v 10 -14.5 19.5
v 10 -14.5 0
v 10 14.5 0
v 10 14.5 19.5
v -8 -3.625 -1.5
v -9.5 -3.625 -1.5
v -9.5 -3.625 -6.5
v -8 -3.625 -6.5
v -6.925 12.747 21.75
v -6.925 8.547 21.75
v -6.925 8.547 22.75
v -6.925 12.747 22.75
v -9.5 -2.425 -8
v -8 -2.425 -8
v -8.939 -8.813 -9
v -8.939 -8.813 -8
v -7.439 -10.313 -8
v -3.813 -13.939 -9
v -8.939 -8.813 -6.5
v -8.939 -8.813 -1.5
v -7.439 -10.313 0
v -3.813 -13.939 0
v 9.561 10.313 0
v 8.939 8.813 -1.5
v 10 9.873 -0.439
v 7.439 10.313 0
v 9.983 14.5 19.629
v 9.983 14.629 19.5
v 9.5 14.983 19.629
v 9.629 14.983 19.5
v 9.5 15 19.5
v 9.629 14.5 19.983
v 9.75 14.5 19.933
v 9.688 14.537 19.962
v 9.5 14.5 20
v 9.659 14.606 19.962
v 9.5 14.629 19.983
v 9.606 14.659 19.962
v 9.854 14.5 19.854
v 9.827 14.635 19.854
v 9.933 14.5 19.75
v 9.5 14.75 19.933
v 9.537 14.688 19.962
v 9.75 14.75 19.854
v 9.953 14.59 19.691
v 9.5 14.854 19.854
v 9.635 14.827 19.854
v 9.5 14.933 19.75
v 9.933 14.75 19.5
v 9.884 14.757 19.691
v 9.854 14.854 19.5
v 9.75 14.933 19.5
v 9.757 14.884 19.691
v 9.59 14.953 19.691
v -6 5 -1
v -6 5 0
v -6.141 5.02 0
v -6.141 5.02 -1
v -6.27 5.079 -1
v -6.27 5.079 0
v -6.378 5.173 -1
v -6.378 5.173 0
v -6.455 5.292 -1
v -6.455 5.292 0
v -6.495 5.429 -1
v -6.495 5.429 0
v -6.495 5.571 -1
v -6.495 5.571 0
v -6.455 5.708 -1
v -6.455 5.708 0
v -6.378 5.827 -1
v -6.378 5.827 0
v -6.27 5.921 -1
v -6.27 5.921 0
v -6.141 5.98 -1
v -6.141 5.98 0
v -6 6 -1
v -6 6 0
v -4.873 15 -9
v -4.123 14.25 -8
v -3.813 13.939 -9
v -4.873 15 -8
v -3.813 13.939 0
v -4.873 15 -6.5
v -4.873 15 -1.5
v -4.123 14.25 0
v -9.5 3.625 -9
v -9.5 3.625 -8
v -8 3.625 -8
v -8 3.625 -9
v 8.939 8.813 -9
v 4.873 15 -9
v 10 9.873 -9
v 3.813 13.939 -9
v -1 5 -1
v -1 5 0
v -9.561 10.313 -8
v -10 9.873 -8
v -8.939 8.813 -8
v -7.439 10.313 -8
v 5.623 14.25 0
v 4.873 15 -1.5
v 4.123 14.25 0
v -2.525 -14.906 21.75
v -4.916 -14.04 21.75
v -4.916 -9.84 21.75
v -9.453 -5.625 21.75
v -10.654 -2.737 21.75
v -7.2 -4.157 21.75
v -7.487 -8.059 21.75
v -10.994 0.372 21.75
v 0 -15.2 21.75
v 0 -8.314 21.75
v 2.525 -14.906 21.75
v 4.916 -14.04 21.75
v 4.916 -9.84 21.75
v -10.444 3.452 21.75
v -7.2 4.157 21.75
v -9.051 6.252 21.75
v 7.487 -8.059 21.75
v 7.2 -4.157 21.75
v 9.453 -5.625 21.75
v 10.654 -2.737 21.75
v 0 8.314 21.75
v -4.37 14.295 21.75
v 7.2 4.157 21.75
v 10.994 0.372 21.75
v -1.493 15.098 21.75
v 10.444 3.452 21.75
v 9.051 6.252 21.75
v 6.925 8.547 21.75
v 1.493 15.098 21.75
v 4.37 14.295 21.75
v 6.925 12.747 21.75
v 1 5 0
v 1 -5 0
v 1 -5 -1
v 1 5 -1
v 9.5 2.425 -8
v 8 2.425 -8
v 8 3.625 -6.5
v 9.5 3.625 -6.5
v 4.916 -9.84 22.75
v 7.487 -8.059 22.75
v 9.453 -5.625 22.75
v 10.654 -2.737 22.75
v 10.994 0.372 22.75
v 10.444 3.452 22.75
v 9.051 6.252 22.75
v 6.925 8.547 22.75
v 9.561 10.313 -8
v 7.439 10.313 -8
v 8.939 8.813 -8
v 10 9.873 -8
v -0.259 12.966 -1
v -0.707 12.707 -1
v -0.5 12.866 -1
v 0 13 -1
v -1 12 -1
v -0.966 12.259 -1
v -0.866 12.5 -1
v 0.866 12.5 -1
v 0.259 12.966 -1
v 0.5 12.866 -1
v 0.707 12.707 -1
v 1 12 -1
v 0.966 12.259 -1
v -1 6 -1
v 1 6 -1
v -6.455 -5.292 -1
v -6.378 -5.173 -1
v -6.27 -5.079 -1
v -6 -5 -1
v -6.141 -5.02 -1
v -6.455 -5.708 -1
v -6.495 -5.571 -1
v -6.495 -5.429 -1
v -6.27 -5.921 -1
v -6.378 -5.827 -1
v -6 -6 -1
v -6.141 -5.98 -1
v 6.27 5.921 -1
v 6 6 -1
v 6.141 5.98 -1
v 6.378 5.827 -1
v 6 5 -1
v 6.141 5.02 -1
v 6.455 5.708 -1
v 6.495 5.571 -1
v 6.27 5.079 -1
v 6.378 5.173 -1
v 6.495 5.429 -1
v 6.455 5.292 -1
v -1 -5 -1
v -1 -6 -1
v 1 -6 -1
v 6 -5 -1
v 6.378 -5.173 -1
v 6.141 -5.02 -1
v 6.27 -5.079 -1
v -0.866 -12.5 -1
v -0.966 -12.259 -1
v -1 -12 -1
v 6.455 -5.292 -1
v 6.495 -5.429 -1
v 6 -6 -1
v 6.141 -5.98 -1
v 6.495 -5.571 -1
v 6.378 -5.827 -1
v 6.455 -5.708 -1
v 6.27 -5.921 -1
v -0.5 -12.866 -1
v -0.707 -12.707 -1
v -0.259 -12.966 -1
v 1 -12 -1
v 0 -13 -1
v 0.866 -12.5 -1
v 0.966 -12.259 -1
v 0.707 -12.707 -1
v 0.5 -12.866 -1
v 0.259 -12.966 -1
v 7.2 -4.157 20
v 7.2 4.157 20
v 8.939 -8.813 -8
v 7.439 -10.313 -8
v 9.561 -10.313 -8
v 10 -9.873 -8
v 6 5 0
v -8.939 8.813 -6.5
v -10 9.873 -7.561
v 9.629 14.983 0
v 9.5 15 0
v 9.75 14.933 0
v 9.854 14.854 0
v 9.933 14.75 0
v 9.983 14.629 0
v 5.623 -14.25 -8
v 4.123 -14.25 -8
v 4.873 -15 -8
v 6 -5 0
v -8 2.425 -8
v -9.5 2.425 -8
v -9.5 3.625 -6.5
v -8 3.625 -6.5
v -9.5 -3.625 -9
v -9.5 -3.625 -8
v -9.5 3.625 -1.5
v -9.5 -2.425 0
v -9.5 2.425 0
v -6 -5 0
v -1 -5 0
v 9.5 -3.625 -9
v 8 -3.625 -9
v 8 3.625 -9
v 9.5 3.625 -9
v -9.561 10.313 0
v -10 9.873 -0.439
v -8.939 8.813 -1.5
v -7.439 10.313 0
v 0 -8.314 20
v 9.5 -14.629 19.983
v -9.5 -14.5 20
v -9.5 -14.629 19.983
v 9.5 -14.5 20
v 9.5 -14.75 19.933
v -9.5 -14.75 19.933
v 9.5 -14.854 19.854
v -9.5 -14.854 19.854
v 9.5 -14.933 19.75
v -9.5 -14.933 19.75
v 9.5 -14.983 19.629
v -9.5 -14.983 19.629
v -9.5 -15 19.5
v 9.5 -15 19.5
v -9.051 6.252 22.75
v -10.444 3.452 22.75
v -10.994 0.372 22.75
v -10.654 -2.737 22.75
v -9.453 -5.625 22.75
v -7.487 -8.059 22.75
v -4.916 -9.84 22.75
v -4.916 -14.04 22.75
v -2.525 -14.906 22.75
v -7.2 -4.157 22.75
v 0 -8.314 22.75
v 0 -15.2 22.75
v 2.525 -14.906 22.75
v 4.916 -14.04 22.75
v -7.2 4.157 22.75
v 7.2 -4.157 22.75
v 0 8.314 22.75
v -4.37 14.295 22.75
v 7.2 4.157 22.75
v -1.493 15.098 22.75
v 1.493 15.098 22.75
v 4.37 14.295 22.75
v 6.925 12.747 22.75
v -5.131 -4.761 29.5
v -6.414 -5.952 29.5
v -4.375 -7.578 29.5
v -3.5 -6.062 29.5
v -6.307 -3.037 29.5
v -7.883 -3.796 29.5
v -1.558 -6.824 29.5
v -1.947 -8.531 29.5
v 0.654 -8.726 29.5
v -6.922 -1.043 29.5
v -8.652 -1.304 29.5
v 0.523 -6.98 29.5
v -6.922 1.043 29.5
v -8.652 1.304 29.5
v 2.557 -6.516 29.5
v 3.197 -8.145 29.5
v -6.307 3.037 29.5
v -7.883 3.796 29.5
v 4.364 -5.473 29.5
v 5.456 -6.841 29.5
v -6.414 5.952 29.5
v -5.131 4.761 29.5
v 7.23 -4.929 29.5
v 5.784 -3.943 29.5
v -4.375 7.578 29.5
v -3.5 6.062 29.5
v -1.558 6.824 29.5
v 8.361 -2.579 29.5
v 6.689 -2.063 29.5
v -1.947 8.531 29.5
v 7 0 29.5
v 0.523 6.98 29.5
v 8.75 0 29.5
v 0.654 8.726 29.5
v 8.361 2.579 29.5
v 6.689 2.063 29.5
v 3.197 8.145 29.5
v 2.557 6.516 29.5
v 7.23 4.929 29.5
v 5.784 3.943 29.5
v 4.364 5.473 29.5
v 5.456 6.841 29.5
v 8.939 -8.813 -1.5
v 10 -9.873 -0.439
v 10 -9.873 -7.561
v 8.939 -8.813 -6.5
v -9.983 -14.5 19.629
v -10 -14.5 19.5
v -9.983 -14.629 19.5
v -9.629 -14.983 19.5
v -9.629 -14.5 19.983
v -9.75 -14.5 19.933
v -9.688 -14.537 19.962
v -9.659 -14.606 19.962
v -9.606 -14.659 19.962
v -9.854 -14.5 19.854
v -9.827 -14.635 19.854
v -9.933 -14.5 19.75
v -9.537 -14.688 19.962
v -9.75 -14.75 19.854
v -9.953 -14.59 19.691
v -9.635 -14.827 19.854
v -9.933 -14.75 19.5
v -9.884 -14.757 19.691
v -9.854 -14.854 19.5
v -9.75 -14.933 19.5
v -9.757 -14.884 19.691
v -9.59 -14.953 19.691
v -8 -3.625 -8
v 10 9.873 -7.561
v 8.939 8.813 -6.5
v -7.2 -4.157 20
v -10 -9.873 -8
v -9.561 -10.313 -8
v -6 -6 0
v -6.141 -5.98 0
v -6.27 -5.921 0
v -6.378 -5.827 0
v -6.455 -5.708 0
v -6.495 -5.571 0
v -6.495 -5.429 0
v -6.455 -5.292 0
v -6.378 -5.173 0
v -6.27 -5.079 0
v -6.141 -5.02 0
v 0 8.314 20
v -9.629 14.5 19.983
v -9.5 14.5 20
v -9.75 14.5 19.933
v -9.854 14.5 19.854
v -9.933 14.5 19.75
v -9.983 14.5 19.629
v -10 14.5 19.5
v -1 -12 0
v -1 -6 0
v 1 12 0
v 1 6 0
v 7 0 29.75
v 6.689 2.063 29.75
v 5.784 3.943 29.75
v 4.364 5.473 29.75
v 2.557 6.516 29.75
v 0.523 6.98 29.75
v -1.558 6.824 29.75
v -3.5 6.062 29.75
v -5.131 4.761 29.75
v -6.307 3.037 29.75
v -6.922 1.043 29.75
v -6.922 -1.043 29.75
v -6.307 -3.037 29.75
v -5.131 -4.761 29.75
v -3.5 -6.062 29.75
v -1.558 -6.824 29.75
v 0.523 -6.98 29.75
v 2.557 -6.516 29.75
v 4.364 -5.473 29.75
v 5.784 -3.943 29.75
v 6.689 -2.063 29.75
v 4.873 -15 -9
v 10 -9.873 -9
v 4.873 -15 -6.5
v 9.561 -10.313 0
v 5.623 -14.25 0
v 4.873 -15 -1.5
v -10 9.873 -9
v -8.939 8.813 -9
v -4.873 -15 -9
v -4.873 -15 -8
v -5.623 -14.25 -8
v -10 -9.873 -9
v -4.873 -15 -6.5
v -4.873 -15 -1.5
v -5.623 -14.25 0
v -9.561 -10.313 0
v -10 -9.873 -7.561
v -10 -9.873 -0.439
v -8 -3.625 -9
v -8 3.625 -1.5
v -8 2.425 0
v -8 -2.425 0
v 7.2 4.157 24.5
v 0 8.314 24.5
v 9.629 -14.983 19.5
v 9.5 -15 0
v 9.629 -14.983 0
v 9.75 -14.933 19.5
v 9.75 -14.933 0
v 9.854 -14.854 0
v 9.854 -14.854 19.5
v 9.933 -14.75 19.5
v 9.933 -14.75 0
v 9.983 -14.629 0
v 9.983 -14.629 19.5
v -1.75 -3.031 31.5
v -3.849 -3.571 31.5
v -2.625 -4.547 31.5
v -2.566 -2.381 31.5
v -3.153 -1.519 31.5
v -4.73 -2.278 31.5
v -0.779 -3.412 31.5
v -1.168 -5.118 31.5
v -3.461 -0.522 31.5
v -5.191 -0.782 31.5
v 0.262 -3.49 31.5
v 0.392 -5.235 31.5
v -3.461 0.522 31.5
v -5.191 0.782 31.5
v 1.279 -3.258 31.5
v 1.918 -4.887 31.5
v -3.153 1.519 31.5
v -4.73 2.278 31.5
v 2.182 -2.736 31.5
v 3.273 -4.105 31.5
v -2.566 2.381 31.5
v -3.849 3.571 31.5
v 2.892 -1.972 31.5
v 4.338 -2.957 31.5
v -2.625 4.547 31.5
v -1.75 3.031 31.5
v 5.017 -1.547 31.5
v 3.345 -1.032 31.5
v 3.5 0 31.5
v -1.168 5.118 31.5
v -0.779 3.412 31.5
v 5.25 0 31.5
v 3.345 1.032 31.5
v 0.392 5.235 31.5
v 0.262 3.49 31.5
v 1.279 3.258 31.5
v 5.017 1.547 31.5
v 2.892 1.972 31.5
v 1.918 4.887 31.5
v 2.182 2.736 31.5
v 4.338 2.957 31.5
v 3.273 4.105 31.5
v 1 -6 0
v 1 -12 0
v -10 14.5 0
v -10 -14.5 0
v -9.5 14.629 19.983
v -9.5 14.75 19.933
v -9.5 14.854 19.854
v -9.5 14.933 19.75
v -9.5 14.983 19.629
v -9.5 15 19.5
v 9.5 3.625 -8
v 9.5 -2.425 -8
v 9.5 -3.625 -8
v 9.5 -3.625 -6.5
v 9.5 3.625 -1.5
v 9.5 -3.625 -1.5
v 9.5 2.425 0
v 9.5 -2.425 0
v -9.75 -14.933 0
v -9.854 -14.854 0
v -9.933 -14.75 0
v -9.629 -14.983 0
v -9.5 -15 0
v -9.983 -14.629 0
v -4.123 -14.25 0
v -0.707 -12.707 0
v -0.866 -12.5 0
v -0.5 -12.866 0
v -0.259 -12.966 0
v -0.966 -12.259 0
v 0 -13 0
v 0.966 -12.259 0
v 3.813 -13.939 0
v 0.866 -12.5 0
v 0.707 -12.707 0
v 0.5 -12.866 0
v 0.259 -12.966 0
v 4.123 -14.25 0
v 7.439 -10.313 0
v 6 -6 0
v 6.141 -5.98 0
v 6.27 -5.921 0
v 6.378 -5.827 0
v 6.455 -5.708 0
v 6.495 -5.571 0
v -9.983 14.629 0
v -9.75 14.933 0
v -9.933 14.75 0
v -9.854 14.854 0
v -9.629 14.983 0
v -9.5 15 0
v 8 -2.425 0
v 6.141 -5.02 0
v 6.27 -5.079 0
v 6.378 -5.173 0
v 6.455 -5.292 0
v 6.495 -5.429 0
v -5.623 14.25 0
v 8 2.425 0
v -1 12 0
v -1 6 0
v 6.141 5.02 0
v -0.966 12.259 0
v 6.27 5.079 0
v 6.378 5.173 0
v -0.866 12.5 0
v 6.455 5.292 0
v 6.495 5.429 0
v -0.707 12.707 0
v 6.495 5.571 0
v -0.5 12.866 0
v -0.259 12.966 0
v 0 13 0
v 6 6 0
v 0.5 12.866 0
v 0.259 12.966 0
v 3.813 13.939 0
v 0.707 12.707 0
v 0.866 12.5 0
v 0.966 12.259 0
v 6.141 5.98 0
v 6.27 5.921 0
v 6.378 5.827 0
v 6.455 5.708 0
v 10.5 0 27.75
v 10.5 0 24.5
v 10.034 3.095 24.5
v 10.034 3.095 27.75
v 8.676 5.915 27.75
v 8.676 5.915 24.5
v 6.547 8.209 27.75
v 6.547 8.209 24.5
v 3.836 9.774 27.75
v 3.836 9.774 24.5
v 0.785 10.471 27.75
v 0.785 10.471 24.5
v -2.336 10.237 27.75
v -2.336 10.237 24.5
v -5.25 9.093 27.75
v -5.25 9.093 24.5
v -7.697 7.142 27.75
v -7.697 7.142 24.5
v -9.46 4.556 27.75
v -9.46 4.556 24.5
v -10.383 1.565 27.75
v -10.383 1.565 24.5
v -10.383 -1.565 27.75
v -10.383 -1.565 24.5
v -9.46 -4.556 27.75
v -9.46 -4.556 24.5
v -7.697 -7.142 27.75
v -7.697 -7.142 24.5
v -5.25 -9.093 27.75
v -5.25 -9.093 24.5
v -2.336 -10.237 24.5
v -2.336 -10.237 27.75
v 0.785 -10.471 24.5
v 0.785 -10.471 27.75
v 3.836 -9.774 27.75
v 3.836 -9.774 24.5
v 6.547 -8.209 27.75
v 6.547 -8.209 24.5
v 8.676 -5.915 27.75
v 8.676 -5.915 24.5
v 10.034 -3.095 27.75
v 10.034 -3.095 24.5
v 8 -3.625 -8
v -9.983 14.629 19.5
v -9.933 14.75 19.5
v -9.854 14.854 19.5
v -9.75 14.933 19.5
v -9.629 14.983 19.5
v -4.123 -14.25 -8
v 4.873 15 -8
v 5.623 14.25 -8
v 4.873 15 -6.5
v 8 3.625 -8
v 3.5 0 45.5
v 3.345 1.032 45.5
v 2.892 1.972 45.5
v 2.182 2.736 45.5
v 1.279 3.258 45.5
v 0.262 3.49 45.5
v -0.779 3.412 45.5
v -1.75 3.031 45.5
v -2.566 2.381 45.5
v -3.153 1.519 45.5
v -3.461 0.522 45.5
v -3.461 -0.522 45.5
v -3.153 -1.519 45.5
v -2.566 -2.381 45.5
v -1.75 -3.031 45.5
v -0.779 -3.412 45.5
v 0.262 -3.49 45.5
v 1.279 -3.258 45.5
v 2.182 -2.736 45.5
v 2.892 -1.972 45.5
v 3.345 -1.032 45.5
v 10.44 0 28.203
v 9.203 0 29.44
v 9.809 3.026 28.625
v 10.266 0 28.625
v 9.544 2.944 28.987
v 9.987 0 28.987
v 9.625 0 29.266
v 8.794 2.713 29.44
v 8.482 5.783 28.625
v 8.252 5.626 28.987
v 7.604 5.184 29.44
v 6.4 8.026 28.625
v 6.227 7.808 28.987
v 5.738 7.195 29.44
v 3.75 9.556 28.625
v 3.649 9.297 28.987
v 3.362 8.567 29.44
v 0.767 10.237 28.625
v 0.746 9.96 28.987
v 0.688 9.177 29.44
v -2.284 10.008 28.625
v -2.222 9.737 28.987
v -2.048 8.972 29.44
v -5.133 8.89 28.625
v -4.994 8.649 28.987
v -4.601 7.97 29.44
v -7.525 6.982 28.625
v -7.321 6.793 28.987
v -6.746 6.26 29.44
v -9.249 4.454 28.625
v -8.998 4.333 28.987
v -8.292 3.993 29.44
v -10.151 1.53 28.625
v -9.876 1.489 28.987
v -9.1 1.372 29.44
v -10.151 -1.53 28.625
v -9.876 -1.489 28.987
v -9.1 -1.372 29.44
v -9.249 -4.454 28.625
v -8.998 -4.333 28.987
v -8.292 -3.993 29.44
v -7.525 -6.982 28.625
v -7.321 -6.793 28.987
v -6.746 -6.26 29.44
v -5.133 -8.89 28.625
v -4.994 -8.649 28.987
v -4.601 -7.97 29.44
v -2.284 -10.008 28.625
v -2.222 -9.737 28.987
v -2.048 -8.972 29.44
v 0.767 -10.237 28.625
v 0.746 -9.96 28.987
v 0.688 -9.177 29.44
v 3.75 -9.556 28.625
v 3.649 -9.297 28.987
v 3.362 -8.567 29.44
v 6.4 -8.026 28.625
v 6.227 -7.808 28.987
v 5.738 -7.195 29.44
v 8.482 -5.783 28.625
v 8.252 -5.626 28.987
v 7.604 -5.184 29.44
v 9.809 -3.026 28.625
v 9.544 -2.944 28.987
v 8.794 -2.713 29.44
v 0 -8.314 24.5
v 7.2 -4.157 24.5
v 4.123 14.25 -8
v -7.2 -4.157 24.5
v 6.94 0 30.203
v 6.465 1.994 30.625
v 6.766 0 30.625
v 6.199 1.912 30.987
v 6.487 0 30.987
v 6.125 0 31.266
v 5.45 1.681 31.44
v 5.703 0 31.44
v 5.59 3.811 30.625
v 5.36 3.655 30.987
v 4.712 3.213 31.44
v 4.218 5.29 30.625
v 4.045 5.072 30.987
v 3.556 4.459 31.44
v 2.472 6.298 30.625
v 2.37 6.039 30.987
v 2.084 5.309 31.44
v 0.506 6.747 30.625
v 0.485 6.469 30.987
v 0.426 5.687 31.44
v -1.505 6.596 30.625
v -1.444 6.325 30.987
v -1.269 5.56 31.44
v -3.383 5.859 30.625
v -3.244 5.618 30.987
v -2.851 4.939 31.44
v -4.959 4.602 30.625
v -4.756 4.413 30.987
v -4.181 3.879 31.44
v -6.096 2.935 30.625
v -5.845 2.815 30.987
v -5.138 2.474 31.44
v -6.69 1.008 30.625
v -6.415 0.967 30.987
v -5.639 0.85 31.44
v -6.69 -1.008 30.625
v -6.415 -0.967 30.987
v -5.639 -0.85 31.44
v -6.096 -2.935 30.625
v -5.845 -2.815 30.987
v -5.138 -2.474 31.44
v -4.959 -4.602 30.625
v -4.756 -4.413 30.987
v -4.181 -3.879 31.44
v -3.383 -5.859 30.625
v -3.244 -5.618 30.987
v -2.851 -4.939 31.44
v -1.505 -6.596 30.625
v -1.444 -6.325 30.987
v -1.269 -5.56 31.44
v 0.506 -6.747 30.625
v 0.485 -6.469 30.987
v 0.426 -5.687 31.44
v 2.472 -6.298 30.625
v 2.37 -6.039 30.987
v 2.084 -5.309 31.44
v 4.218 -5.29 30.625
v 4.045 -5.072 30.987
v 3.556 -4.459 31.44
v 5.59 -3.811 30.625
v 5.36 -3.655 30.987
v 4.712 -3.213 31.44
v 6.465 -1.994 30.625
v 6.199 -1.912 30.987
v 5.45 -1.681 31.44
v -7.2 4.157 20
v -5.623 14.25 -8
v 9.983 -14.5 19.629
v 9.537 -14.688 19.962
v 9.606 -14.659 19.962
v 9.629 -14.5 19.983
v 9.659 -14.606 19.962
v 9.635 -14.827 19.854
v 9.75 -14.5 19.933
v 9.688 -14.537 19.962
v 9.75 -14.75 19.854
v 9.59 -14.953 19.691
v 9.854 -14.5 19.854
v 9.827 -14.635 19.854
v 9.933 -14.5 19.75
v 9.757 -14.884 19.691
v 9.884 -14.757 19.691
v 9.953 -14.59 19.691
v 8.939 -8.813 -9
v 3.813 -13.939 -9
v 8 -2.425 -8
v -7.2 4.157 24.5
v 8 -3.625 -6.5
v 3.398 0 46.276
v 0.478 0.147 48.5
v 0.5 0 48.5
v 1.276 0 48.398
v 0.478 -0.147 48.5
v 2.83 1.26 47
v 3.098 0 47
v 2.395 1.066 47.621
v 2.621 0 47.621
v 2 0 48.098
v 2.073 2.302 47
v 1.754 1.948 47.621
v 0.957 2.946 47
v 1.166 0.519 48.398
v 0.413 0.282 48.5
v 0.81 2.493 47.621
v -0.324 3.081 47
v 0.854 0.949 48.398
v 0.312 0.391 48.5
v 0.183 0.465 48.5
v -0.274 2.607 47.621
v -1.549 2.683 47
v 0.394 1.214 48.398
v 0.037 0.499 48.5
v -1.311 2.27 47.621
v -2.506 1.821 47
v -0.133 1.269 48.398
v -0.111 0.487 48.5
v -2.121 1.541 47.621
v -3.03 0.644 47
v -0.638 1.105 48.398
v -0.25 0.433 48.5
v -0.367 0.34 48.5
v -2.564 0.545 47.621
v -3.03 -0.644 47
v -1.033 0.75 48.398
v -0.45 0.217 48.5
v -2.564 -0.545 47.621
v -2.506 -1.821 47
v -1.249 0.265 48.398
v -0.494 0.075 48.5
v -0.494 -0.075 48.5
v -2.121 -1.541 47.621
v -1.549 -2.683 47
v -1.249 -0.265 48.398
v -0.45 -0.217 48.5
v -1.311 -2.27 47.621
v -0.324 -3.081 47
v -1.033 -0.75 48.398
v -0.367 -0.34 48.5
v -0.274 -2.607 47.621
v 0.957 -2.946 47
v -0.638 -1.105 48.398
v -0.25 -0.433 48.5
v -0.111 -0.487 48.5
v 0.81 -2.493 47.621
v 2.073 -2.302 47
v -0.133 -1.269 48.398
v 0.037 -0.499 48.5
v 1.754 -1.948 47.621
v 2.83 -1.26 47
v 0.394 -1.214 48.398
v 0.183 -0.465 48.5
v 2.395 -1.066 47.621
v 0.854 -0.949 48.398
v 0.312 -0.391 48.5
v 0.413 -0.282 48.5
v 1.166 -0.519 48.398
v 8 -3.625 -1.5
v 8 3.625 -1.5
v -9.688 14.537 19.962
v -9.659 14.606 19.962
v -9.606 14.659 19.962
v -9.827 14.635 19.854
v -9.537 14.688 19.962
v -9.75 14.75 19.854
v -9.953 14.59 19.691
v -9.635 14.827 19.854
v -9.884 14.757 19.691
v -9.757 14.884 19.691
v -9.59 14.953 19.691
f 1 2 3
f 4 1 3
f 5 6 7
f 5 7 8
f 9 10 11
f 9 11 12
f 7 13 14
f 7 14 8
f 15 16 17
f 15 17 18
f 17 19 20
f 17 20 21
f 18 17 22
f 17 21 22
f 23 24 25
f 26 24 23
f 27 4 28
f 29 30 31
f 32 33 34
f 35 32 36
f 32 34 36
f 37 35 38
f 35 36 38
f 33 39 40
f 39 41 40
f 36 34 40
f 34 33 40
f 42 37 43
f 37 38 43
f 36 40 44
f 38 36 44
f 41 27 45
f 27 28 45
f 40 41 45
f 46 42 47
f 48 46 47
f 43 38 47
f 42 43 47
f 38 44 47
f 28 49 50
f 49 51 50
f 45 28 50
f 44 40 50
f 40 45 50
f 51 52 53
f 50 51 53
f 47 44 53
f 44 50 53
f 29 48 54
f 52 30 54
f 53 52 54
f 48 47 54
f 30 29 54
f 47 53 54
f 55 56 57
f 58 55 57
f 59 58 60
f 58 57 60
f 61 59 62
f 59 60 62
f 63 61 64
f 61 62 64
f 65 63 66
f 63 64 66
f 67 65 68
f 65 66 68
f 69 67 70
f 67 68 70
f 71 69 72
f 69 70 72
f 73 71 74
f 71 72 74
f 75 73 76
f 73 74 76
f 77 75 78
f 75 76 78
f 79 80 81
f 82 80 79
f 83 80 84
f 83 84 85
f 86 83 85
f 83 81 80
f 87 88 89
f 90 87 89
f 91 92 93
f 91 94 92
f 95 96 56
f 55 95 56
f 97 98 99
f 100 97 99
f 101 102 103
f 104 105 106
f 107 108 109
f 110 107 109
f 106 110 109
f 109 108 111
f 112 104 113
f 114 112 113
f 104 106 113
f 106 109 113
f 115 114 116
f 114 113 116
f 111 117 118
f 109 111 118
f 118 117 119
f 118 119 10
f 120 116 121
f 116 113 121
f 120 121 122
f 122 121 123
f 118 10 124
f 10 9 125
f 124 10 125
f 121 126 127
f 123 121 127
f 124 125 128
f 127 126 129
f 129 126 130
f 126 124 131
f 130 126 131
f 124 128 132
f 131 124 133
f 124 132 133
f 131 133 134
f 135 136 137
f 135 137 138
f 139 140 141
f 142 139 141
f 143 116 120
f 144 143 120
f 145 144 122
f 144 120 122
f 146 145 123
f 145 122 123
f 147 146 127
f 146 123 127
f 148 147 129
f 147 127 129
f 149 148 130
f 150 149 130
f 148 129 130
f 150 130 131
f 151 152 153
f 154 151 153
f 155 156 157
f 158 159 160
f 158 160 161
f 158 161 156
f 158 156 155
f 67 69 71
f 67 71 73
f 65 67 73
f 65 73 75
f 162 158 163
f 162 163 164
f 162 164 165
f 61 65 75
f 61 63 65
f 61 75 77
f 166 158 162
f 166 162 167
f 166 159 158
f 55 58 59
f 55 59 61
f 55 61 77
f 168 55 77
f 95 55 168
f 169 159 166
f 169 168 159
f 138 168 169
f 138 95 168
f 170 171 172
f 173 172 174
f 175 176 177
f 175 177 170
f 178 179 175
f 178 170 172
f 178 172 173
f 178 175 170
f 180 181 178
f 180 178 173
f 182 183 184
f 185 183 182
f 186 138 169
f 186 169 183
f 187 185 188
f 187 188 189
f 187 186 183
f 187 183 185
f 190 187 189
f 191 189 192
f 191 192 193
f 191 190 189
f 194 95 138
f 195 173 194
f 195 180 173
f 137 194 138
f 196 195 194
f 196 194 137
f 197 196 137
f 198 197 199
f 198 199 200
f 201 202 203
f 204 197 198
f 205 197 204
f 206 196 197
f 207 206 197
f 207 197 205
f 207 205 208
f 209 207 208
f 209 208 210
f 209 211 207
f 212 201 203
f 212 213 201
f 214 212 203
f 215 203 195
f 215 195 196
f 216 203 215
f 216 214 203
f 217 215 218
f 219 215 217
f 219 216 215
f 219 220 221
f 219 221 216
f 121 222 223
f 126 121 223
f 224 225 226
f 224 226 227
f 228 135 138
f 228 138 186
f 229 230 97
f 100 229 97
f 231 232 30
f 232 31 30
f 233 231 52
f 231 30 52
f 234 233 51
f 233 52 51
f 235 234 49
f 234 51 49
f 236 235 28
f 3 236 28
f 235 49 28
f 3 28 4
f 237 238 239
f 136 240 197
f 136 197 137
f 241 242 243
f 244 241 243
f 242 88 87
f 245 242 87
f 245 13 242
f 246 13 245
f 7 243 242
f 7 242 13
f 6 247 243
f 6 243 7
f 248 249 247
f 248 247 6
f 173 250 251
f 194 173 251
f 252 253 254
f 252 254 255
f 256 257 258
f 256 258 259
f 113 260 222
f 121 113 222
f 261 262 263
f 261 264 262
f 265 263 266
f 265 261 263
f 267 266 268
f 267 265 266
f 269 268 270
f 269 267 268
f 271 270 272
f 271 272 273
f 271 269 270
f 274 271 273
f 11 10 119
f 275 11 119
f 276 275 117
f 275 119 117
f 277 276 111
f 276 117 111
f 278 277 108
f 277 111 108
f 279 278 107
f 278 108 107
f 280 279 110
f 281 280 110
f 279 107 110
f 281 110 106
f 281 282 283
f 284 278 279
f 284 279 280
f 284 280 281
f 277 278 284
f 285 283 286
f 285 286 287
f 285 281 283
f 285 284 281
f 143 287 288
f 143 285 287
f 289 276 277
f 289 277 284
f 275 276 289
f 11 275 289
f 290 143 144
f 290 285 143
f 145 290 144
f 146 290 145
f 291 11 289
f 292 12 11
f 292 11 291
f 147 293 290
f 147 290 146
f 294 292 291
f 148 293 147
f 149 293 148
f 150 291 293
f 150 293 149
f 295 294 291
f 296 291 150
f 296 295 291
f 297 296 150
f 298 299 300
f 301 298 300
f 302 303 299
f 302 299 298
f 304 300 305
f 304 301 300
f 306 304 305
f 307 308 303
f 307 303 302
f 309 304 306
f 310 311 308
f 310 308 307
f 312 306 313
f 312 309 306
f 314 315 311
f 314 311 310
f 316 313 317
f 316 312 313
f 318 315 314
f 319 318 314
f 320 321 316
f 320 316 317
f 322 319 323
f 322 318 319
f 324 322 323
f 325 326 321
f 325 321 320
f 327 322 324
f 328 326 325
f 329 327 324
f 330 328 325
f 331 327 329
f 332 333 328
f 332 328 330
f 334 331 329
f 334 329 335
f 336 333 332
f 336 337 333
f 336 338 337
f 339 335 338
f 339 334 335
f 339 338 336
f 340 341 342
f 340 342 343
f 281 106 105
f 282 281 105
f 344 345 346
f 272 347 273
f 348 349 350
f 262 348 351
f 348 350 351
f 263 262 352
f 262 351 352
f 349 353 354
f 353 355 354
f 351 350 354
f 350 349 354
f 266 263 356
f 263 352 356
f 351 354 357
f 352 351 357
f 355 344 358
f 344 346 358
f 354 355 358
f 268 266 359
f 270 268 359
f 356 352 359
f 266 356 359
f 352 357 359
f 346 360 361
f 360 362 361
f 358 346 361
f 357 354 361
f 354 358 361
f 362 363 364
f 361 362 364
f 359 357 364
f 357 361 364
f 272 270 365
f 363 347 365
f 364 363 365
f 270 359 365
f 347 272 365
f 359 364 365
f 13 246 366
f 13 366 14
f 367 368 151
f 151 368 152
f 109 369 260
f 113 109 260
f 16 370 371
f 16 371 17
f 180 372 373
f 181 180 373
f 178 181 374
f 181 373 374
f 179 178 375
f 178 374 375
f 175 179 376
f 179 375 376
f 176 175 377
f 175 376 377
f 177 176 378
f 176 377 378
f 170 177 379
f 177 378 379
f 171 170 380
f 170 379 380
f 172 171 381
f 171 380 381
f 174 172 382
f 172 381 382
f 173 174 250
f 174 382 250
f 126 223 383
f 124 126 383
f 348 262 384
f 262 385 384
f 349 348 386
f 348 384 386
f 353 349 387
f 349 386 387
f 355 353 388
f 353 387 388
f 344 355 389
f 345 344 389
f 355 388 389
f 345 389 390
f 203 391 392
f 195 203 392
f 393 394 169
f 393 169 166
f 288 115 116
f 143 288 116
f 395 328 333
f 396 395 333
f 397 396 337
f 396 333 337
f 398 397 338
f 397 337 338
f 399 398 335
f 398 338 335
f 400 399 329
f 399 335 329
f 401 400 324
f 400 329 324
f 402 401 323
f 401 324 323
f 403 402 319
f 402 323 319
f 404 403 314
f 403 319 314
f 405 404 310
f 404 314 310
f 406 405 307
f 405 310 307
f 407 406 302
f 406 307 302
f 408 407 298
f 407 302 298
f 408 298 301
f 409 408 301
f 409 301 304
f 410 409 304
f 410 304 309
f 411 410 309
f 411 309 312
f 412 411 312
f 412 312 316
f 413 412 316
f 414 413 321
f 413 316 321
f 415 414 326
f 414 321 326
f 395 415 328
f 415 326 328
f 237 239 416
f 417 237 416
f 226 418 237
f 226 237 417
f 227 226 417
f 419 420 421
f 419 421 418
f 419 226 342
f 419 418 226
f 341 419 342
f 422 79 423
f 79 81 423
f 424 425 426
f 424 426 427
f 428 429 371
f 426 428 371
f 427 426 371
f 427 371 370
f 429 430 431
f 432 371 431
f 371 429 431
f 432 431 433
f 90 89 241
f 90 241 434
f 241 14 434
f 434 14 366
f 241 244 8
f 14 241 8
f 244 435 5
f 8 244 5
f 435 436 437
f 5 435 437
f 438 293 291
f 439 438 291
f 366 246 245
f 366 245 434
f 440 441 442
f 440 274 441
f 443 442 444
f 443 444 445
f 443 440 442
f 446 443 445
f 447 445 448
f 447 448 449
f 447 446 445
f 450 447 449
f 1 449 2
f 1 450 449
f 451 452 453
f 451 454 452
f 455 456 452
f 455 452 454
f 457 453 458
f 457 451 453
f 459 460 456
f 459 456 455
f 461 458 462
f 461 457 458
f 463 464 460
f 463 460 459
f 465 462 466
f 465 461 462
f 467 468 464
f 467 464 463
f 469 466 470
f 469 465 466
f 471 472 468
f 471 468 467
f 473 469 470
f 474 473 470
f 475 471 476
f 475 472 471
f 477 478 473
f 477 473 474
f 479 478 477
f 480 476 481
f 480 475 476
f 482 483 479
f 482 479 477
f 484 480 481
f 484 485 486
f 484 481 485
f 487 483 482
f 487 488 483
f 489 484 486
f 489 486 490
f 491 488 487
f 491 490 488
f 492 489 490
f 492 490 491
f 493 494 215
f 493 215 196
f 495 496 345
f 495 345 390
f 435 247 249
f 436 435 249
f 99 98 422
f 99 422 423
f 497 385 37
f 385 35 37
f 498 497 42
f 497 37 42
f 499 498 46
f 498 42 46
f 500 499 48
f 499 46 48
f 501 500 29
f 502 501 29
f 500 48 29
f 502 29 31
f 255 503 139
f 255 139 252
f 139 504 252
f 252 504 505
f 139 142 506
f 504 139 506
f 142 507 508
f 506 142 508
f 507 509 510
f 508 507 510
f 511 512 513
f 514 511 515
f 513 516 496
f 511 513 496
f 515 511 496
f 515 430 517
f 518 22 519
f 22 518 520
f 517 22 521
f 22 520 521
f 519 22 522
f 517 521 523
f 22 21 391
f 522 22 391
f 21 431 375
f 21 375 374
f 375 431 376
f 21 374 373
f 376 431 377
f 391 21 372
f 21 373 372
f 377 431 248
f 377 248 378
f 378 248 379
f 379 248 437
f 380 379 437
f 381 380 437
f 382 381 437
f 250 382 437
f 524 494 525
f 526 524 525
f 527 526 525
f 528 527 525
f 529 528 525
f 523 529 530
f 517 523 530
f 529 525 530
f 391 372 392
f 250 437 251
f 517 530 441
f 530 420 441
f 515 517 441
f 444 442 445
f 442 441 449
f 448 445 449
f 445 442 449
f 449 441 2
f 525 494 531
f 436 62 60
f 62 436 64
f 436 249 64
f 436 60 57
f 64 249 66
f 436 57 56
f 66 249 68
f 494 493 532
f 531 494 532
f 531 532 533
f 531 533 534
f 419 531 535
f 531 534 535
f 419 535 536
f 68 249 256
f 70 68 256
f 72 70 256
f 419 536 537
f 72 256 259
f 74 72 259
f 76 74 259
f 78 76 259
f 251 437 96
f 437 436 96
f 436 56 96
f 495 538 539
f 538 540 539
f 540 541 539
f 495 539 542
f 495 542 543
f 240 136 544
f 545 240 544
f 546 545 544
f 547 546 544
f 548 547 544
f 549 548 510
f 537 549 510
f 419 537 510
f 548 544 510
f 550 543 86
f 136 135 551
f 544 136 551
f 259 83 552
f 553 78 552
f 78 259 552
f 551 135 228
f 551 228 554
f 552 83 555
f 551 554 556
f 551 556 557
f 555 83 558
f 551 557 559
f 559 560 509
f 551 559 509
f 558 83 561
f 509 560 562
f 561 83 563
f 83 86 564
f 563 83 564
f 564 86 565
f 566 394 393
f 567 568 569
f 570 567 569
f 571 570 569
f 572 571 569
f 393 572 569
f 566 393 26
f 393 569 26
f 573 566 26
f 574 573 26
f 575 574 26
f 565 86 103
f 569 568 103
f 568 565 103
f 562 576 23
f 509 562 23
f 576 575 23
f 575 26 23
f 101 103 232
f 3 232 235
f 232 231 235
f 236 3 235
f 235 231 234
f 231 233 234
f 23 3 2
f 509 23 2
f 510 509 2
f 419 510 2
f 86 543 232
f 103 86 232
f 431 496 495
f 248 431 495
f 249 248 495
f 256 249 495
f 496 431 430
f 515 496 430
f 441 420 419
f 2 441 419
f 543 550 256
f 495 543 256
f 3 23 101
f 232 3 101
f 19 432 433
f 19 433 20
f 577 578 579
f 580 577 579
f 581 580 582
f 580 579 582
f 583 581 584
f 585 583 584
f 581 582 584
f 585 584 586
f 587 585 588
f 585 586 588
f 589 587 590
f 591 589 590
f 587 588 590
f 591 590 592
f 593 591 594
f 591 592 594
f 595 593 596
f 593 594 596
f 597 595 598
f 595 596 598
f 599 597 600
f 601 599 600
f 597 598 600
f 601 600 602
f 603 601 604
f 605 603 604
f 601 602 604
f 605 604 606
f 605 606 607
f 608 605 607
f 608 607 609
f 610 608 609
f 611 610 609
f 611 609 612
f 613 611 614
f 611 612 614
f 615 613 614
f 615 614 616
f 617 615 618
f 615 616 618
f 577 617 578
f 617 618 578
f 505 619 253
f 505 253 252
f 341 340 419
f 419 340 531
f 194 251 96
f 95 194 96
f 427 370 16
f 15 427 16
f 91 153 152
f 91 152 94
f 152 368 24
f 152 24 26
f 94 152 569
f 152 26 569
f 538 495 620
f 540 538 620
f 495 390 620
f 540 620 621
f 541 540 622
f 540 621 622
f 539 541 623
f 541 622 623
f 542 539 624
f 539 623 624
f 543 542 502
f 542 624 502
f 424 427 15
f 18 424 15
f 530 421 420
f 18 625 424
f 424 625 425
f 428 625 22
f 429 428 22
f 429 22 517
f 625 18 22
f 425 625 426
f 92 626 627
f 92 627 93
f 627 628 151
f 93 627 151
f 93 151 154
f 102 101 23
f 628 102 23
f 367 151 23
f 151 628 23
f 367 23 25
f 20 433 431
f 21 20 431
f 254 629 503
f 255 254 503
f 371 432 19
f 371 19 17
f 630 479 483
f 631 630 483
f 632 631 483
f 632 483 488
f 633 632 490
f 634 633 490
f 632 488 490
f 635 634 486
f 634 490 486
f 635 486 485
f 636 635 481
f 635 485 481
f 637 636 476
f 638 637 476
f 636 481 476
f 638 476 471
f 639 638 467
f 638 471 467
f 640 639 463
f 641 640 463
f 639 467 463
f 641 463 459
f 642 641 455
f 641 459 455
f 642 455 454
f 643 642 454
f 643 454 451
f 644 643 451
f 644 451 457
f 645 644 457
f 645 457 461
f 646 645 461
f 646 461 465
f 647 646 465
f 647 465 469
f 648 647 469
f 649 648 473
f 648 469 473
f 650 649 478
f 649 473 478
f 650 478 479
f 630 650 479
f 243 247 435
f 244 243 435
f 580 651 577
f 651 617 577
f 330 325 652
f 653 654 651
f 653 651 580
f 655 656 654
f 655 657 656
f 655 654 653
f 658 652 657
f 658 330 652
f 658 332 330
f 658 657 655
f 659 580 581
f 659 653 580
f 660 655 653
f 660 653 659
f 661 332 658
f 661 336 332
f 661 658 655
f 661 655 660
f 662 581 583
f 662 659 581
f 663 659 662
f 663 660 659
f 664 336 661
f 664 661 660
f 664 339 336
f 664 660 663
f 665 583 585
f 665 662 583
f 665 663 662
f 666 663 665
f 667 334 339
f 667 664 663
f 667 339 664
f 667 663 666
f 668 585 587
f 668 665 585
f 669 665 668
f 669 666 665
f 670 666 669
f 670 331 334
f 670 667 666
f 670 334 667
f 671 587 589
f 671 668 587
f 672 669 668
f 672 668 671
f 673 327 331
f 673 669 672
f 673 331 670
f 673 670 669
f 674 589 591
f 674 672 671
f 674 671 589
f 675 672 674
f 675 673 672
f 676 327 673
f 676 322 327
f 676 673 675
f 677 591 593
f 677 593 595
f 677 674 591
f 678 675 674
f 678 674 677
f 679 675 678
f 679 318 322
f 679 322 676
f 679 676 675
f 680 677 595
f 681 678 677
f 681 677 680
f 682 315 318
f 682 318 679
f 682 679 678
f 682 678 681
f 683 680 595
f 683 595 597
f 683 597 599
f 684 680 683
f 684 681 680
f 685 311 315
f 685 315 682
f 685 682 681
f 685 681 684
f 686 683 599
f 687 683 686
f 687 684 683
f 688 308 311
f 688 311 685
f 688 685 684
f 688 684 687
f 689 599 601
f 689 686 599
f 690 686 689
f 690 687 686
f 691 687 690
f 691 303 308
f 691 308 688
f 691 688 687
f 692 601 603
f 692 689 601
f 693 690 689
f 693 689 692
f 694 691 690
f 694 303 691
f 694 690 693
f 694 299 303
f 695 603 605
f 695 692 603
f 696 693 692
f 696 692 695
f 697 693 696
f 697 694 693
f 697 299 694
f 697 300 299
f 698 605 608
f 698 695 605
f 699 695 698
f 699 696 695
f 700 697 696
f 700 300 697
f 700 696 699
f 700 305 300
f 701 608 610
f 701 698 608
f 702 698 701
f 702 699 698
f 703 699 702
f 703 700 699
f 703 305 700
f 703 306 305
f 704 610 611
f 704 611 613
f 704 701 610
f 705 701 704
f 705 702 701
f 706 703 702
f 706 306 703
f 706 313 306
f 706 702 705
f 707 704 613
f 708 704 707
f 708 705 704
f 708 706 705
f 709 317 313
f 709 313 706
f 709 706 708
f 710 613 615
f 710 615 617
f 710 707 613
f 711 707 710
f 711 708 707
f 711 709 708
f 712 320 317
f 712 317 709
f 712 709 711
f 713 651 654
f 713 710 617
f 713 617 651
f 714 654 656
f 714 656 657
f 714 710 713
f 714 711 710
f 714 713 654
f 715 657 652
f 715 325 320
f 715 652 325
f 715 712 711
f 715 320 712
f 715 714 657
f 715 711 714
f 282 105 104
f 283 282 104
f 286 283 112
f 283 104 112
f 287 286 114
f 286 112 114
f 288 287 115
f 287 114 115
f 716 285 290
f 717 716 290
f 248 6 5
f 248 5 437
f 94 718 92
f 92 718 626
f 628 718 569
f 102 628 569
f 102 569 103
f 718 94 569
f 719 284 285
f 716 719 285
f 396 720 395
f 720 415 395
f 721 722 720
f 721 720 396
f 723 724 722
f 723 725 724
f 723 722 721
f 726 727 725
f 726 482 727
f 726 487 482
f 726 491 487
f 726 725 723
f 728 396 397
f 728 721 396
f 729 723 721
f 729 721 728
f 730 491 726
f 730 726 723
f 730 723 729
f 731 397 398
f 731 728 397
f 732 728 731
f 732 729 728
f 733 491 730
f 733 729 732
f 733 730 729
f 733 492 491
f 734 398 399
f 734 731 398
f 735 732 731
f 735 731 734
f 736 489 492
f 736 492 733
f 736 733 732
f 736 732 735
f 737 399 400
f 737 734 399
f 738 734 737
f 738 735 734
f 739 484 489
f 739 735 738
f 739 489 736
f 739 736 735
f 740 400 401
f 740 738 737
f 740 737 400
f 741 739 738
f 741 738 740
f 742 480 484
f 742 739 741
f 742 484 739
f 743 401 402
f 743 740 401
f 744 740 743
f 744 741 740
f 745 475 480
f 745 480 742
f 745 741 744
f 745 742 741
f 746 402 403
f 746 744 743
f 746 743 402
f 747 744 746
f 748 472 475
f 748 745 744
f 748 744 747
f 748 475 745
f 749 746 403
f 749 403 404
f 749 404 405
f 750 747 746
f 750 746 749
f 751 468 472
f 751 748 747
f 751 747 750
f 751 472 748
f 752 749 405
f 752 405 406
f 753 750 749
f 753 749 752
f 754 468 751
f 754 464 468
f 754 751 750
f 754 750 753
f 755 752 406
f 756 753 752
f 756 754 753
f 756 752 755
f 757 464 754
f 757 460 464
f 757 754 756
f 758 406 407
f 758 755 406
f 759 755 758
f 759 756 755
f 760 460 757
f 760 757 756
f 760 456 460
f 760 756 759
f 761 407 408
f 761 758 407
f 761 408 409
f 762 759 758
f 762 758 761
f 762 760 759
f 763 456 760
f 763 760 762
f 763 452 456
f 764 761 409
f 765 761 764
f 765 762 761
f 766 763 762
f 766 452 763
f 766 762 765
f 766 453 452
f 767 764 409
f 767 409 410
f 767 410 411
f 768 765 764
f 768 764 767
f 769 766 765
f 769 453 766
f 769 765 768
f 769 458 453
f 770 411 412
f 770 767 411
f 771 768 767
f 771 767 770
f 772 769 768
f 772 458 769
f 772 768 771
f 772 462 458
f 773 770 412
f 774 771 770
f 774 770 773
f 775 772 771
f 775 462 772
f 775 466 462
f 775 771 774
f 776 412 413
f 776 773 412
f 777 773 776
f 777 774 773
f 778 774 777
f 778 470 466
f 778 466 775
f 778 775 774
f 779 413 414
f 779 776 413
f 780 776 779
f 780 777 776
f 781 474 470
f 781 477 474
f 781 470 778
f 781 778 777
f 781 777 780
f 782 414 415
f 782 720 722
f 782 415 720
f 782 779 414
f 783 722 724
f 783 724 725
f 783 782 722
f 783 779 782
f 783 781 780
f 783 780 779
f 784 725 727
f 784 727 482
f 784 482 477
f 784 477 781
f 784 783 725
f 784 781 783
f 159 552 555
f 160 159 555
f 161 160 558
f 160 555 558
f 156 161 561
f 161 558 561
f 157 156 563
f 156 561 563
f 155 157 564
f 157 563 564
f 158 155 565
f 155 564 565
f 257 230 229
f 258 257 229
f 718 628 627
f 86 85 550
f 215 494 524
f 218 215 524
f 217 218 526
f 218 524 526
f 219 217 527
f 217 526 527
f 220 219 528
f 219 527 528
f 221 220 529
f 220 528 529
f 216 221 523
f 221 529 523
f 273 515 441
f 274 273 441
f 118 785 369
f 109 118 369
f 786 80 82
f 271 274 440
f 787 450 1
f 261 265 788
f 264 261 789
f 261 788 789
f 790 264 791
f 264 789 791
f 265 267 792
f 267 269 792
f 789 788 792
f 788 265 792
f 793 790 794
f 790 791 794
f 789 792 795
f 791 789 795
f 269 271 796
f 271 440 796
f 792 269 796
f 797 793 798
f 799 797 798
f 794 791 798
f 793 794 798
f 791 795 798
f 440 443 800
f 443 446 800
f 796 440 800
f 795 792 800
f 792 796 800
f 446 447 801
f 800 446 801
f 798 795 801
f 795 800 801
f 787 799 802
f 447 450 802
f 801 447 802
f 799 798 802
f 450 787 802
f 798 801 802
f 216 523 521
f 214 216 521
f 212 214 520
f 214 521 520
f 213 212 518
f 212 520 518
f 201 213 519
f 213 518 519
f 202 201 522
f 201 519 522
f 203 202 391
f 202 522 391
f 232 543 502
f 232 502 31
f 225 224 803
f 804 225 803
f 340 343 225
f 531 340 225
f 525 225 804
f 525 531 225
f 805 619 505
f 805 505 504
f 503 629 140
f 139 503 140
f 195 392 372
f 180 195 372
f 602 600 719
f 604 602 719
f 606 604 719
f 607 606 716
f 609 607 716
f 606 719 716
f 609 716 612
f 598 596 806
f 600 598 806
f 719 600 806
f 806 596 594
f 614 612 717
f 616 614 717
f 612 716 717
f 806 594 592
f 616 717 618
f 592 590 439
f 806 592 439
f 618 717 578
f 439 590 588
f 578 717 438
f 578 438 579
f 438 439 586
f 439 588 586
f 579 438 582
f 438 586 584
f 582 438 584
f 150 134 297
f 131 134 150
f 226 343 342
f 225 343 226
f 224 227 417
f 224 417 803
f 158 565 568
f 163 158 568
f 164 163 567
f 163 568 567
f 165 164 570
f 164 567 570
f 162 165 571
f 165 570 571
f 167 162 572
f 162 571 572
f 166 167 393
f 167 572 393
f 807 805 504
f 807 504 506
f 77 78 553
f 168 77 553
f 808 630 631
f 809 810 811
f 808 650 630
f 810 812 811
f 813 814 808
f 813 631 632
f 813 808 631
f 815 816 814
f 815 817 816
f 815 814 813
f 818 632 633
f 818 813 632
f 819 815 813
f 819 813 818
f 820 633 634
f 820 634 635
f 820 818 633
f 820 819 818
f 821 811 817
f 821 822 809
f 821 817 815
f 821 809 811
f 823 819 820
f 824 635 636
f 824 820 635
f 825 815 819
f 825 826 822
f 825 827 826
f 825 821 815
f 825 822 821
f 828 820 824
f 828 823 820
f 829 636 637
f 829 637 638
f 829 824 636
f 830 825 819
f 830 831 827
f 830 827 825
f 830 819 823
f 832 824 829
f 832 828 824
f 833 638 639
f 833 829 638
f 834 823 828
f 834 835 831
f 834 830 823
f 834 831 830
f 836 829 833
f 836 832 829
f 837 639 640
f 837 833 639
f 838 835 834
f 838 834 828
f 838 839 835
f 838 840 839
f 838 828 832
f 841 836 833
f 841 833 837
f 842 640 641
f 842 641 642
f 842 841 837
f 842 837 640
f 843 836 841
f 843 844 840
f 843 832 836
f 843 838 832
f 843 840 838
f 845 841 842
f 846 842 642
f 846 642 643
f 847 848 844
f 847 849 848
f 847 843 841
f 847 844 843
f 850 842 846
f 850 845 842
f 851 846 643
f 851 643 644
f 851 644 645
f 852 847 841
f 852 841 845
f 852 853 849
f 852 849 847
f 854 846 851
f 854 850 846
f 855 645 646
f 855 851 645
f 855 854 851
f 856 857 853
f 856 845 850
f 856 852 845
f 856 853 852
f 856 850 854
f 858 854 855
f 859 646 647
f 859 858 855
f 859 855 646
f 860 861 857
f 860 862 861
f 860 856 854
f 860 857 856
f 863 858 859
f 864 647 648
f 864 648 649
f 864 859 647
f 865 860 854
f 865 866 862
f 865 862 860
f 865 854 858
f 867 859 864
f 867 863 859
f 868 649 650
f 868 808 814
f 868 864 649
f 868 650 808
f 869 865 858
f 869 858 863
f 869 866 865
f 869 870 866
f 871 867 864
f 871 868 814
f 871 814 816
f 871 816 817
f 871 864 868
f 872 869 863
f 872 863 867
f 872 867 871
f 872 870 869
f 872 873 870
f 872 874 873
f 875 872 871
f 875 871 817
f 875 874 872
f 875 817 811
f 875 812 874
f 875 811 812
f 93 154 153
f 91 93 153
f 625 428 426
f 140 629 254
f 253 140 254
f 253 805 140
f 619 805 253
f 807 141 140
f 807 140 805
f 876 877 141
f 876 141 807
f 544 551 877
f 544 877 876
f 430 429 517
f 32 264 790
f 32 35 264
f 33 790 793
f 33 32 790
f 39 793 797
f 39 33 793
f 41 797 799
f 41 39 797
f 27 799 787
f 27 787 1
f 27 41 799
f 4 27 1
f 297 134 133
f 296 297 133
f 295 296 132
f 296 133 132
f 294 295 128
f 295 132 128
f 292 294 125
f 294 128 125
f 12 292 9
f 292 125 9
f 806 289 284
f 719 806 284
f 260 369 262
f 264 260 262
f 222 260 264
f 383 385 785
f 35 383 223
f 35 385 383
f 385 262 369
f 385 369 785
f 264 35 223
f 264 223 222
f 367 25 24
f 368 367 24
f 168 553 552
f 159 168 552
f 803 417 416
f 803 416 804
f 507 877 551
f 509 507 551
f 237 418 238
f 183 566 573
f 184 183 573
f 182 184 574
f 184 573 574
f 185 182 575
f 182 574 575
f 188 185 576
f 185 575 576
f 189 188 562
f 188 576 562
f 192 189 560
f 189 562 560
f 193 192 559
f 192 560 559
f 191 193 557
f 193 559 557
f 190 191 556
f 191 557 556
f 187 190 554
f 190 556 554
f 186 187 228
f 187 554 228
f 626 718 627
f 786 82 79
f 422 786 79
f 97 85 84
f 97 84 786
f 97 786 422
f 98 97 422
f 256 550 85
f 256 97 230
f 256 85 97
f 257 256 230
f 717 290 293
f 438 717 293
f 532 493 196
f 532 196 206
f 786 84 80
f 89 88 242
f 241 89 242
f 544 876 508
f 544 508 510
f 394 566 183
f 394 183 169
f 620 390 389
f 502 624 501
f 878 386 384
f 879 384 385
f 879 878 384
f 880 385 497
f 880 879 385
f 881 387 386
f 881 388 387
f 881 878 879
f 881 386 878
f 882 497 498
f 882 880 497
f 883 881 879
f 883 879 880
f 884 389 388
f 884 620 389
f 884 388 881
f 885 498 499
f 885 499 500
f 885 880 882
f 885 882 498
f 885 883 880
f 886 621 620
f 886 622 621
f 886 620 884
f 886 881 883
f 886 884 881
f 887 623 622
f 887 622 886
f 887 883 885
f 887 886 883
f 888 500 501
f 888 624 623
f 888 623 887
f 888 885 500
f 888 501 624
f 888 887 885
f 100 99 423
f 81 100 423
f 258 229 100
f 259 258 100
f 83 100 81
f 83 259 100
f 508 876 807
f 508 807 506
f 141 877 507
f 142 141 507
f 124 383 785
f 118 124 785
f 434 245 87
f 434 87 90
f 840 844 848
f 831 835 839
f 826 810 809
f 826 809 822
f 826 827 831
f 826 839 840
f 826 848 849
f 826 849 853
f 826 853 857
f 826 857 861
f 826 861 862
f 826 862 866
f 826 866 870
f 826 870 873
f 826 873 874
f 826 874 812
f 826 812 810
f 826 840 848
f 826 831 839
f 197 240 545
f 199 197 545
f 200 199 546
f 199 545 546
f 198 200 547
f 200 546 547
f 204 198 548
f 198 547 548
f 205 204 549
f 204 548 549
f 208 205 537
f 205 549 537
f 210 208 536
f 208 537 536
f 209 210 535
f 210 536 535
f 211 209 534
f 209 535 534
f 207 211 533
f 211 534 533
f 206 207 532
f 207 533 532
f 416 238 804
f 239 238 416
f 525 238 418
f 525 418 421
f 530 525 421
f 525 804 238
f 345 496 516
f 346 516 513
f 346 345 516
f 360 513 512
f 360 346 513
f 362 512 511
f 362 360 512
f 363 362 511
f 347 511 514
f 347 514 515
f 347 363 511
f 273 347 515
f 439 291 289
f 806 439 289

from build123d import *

# Parameters (mm, degrees)
SKETCH_W     = 20
SKETCH_H     = 30
PAD_DEPTH    = 20
PAD001_DEPTH = 1.75
PAD002_DEPTH = 1
PAD003_DEPTH = 1.75
SKETCH004_R  = 10.5
PAD004_DEPTH = 5
SKETCH005_R  = 7
PAD005_DEPTH = 2
SKETCH006_R  = 3.5
PAD006_DEPTH = 17
FILLET_R     = 3
FILLET001_R  = 0.5
FILLET002_R  = 1.75
SKETCH007_W  = 1.5
SKETCH007_H  = 7.25
PAD007_DEPTH = 9
POCKET_DEPTH = 21.001
PAD008_DEPTH = 1


with BuildPart() as part:
    # Sketch → Pad (new body)
    with BuildSketch(Plane.XY):
        Rectangle(SKETCH_W, SKETCH_H)
    extrude(amount=PAD_DEPTH)

    # Sketch001 (on Face6 of Pad) → Pad001 (join)
    with BuildSketch(Plane.XY.offset(20)):
        Polygon((0, -8.313844), (7.2, -4.156922), (7.2, 4.156922), (0, 8.313844), (-7.2, 4.156922), (-7.2, -4.156922), align=None)
    extrude(amount=PAD001_DEPTH)

    # Sketch002 (on Face13 of Pad001) → Pad002 (join)
    with BuildSketch(Plane.XY.offset(21.75)):
        with BuildLine():
            ThreePointArc((6.924821, 12.746745), (0, 15.2), (-6.924821, 12.746745))
            Line((-6.924821, 8.546745), (-6.924821, 12.746745))
            ThreePointArc((-6.924821, 8.546745), (-10.934933, -1.194675), (-4.915971, -9.840388))
            Line((-4.915971, -9.840388), (-4.915971, -14.040388))
            ThreePointArc((-4.915971, -14.040388), (0, -15.2), (4.915971, -14.040388))
            Line((4.915971, -14.040388), (4.915971, -9.840388))
            ThreePointArc((4.915971, -9.840388), (10.934933, -1.194675), (6.924821, 8.546745))
            Line((6.924821, 12.746745), (6.924821, 8.546745))
        make_face()
    extrude(amount=PAD002_DEPTH)

    # Sketch003 (on Face22 of Pad002) → Pad003 (join)
    with BuildSketch(Plane.XY.offset(22.75)):
        Polygon((7.2, 4.156922), (0, 8.313844), (-7.2, 4.156922), (-7.2, -4.156922), (0, -8.313844), (7.2, -4.156922), align=None)
    extrude(amount=PAD003_DEPTH)

    # Sketch004 (on Face29 of Pad003) → Pad004 (join)
    with BuildSketch(Plane.XY.offset(24.5)):
        Circle(SKETCH004_R)
    extrude(amount=PAD004_DEPTH)

    # Sketch005 (on Face31 of Pad004) → Pad005 (join)
    with BuildSketch(Plane.XY.offset(29.5)):
        Circle(SKETCH005_R)
    extrude(amount=PAD005_DEPTH)

    # Sketch006 (on Face33 of Pad005) → Pad006 (join)
    with BuildSketch(Plane.XY.offset(31.5)):
        Circle(SKETCH006_R)
    extrude(amount=PAD006_DEPTH)

    # Fillet
    fillet_edges = [part.edges().sort_by_distance(p)[0] for p in [
        (-3.5, 0, 48.5),
    ]]
    fillet(fillet_edges, radius=FILLET_R)

    # Fillet001
    fillet001_edges = [part.edges().sort_by_distance(p)[0] for p in [
        (10, 15, 10),
        (10, -15, 10),
        (-10, -15, 10),
        (-10, 15, 10),
        (-10, 0, 20),
        (0, -15, 20),
        (10, 0, 20),
        (0, 15, 20),
    ]]
    fillet(fillet001_edges, radius=FILLET001_R)

    # Fillet002
    fillet002_edges = [part.edges().sort_by_distance(p)[0] for p in [
        (-10.5, 0, 29.5),
        (-7, 0, 31.5),
    ]]
    fillet(fillet002_edges, radius=FILLET002_R)

    # Sketch007 (on Face47 of Fillet002) → Pad007 (join)
    with BuildSketch(Plane(origin=(0, 0, 0), x_dir=(1, 0, 0), z_dir=(0, 0, -1))):
        Polygon((4.873476, 15), (10, 9.873476), (8.93934, 8.812816), (3.812816, 13.93934), align=None)
        with Locations((8.75, 0)):
            Rectangle(SKETCH007_W, SKETCH007_H)
        Polygon((-4.873476, 15), (-10, 9.873476), (-8.93934, 8.812816), (-3.812816, 13.93934), align=None)
        with Locations((-8.75, 0)):
            Rectangle(SKETCH007_W, SKETCH007_H)
        Polygon((4.873476, -15), (10, -9.873476), (8.93934, -8.812816), (3.812816, -13.93934), align=None)
        Polygon((-4.873476, -15), (-10, -9.873476), (-8.93934, -8.812816), (-3.812816, -13.93934), align=None)
    extrude(amount=PAD007_DEPTH)

    # Sketch008 (on Face39 of Pad007) → Pocket (cut, through all)
    with BuildSketch(Plane(origin=(-10, 0, 0), x_dir=(0, -1, 0), z_dir=(-1, 0, 0))):
        Polygon((-15, 0), (-15, -1.5), (-14.25, 0), align=None)
        Polygon((-8.812816, 0), (-8.812816, -1.5), (-10.312816, 0), align=None)
        Polygon((-15, -6.5), (-14.25, -8), (-15, -8), align=None)
        Polygon((-8.812816, -8), (-8.812816, -6.5), (-10.312816, -8), align=None)
        Polygon((15, 0), (15, -1.5), (14.25, 0), align=None)
        Polygon((8.812816, 0), (8.812816, -1.5), (10.312816, 0), align=None)
        Polygon((15, -6.5), (14.25, -8), (15, -8), align=None)
        Polygon((8.812816, -8), (8.812816, -6.5), (10.312816, -8), align=None)
        Polygon((-3.625, 0), (-3.625, -1.5), (-2.425, 0), align=None)
        Polygon((-3.625, -6.5), (-3.625, -8), (-2.425, -8), align=None)
        Polygon((3.625, 0), (3.625, -1.5), (2.425, 0), align=None)
        Polygon((3.625, -6.5), (3.625, -8), (2.425, -8), align=None)
    extrude(amount=-POCKET_DEPTH, mode=Mode.SUBTRACT)

    # Sketch009 (on Face50 of Pocket) → Pad008 (join)
    with BuildSketch(Plane(origin=(0, 0, 0), x_dir=(1, 0, 0), z_dir=(0, 0, -1))):
        with BuildLine():
            Line((-1, 12), (-1, 6))
            Line((-1, 6), (-6, 6))
            ThreePointArc((-6, 6), (-6.5, 5.5), (-6, 5))
            Line((-6, 5), (-1, 5))
            Line((-1, 5), (-1, -5))
            Line((-1, -5), (-6, -5))
            ThreePointArc((-6, -5), (-6.5, -5.5), (-6, -6))
            Line((-6, -6), (-1, -6))
            Line((-1, -6), (-1, -12))
            ThreePointArc((-1, -12), (-0.707107, -12.707107), (0, -13))
            ThreePointArc((0, -13), (0.707107, -12.707107), (1, -12))
            Line((1, -6), (1, -12))
            Line((6, -6), (1, -6))
            ThreePointArc((6, -6), (6.5, -5.5), (6, -5))
            Line((1, -5), (6, -5))
            Line((1, 5), (1, -5))
            Line((6, 5), (1, 5))
            ThreePointArc((6, 5), (6.5, 5.5), (6, 6))
            Line((1, 6), (6, 6))
            Line((1, 12), (1, 6))
            ThreePointArc((1, 12), (0.707107, 12.707107), (0, 13))
            ThreePointArc((0, 13), (-0.707107, 12.707107), (-1, 12))
        make_face()
    extrude(amount=PAD008_DEPTH)


solid = part.part
